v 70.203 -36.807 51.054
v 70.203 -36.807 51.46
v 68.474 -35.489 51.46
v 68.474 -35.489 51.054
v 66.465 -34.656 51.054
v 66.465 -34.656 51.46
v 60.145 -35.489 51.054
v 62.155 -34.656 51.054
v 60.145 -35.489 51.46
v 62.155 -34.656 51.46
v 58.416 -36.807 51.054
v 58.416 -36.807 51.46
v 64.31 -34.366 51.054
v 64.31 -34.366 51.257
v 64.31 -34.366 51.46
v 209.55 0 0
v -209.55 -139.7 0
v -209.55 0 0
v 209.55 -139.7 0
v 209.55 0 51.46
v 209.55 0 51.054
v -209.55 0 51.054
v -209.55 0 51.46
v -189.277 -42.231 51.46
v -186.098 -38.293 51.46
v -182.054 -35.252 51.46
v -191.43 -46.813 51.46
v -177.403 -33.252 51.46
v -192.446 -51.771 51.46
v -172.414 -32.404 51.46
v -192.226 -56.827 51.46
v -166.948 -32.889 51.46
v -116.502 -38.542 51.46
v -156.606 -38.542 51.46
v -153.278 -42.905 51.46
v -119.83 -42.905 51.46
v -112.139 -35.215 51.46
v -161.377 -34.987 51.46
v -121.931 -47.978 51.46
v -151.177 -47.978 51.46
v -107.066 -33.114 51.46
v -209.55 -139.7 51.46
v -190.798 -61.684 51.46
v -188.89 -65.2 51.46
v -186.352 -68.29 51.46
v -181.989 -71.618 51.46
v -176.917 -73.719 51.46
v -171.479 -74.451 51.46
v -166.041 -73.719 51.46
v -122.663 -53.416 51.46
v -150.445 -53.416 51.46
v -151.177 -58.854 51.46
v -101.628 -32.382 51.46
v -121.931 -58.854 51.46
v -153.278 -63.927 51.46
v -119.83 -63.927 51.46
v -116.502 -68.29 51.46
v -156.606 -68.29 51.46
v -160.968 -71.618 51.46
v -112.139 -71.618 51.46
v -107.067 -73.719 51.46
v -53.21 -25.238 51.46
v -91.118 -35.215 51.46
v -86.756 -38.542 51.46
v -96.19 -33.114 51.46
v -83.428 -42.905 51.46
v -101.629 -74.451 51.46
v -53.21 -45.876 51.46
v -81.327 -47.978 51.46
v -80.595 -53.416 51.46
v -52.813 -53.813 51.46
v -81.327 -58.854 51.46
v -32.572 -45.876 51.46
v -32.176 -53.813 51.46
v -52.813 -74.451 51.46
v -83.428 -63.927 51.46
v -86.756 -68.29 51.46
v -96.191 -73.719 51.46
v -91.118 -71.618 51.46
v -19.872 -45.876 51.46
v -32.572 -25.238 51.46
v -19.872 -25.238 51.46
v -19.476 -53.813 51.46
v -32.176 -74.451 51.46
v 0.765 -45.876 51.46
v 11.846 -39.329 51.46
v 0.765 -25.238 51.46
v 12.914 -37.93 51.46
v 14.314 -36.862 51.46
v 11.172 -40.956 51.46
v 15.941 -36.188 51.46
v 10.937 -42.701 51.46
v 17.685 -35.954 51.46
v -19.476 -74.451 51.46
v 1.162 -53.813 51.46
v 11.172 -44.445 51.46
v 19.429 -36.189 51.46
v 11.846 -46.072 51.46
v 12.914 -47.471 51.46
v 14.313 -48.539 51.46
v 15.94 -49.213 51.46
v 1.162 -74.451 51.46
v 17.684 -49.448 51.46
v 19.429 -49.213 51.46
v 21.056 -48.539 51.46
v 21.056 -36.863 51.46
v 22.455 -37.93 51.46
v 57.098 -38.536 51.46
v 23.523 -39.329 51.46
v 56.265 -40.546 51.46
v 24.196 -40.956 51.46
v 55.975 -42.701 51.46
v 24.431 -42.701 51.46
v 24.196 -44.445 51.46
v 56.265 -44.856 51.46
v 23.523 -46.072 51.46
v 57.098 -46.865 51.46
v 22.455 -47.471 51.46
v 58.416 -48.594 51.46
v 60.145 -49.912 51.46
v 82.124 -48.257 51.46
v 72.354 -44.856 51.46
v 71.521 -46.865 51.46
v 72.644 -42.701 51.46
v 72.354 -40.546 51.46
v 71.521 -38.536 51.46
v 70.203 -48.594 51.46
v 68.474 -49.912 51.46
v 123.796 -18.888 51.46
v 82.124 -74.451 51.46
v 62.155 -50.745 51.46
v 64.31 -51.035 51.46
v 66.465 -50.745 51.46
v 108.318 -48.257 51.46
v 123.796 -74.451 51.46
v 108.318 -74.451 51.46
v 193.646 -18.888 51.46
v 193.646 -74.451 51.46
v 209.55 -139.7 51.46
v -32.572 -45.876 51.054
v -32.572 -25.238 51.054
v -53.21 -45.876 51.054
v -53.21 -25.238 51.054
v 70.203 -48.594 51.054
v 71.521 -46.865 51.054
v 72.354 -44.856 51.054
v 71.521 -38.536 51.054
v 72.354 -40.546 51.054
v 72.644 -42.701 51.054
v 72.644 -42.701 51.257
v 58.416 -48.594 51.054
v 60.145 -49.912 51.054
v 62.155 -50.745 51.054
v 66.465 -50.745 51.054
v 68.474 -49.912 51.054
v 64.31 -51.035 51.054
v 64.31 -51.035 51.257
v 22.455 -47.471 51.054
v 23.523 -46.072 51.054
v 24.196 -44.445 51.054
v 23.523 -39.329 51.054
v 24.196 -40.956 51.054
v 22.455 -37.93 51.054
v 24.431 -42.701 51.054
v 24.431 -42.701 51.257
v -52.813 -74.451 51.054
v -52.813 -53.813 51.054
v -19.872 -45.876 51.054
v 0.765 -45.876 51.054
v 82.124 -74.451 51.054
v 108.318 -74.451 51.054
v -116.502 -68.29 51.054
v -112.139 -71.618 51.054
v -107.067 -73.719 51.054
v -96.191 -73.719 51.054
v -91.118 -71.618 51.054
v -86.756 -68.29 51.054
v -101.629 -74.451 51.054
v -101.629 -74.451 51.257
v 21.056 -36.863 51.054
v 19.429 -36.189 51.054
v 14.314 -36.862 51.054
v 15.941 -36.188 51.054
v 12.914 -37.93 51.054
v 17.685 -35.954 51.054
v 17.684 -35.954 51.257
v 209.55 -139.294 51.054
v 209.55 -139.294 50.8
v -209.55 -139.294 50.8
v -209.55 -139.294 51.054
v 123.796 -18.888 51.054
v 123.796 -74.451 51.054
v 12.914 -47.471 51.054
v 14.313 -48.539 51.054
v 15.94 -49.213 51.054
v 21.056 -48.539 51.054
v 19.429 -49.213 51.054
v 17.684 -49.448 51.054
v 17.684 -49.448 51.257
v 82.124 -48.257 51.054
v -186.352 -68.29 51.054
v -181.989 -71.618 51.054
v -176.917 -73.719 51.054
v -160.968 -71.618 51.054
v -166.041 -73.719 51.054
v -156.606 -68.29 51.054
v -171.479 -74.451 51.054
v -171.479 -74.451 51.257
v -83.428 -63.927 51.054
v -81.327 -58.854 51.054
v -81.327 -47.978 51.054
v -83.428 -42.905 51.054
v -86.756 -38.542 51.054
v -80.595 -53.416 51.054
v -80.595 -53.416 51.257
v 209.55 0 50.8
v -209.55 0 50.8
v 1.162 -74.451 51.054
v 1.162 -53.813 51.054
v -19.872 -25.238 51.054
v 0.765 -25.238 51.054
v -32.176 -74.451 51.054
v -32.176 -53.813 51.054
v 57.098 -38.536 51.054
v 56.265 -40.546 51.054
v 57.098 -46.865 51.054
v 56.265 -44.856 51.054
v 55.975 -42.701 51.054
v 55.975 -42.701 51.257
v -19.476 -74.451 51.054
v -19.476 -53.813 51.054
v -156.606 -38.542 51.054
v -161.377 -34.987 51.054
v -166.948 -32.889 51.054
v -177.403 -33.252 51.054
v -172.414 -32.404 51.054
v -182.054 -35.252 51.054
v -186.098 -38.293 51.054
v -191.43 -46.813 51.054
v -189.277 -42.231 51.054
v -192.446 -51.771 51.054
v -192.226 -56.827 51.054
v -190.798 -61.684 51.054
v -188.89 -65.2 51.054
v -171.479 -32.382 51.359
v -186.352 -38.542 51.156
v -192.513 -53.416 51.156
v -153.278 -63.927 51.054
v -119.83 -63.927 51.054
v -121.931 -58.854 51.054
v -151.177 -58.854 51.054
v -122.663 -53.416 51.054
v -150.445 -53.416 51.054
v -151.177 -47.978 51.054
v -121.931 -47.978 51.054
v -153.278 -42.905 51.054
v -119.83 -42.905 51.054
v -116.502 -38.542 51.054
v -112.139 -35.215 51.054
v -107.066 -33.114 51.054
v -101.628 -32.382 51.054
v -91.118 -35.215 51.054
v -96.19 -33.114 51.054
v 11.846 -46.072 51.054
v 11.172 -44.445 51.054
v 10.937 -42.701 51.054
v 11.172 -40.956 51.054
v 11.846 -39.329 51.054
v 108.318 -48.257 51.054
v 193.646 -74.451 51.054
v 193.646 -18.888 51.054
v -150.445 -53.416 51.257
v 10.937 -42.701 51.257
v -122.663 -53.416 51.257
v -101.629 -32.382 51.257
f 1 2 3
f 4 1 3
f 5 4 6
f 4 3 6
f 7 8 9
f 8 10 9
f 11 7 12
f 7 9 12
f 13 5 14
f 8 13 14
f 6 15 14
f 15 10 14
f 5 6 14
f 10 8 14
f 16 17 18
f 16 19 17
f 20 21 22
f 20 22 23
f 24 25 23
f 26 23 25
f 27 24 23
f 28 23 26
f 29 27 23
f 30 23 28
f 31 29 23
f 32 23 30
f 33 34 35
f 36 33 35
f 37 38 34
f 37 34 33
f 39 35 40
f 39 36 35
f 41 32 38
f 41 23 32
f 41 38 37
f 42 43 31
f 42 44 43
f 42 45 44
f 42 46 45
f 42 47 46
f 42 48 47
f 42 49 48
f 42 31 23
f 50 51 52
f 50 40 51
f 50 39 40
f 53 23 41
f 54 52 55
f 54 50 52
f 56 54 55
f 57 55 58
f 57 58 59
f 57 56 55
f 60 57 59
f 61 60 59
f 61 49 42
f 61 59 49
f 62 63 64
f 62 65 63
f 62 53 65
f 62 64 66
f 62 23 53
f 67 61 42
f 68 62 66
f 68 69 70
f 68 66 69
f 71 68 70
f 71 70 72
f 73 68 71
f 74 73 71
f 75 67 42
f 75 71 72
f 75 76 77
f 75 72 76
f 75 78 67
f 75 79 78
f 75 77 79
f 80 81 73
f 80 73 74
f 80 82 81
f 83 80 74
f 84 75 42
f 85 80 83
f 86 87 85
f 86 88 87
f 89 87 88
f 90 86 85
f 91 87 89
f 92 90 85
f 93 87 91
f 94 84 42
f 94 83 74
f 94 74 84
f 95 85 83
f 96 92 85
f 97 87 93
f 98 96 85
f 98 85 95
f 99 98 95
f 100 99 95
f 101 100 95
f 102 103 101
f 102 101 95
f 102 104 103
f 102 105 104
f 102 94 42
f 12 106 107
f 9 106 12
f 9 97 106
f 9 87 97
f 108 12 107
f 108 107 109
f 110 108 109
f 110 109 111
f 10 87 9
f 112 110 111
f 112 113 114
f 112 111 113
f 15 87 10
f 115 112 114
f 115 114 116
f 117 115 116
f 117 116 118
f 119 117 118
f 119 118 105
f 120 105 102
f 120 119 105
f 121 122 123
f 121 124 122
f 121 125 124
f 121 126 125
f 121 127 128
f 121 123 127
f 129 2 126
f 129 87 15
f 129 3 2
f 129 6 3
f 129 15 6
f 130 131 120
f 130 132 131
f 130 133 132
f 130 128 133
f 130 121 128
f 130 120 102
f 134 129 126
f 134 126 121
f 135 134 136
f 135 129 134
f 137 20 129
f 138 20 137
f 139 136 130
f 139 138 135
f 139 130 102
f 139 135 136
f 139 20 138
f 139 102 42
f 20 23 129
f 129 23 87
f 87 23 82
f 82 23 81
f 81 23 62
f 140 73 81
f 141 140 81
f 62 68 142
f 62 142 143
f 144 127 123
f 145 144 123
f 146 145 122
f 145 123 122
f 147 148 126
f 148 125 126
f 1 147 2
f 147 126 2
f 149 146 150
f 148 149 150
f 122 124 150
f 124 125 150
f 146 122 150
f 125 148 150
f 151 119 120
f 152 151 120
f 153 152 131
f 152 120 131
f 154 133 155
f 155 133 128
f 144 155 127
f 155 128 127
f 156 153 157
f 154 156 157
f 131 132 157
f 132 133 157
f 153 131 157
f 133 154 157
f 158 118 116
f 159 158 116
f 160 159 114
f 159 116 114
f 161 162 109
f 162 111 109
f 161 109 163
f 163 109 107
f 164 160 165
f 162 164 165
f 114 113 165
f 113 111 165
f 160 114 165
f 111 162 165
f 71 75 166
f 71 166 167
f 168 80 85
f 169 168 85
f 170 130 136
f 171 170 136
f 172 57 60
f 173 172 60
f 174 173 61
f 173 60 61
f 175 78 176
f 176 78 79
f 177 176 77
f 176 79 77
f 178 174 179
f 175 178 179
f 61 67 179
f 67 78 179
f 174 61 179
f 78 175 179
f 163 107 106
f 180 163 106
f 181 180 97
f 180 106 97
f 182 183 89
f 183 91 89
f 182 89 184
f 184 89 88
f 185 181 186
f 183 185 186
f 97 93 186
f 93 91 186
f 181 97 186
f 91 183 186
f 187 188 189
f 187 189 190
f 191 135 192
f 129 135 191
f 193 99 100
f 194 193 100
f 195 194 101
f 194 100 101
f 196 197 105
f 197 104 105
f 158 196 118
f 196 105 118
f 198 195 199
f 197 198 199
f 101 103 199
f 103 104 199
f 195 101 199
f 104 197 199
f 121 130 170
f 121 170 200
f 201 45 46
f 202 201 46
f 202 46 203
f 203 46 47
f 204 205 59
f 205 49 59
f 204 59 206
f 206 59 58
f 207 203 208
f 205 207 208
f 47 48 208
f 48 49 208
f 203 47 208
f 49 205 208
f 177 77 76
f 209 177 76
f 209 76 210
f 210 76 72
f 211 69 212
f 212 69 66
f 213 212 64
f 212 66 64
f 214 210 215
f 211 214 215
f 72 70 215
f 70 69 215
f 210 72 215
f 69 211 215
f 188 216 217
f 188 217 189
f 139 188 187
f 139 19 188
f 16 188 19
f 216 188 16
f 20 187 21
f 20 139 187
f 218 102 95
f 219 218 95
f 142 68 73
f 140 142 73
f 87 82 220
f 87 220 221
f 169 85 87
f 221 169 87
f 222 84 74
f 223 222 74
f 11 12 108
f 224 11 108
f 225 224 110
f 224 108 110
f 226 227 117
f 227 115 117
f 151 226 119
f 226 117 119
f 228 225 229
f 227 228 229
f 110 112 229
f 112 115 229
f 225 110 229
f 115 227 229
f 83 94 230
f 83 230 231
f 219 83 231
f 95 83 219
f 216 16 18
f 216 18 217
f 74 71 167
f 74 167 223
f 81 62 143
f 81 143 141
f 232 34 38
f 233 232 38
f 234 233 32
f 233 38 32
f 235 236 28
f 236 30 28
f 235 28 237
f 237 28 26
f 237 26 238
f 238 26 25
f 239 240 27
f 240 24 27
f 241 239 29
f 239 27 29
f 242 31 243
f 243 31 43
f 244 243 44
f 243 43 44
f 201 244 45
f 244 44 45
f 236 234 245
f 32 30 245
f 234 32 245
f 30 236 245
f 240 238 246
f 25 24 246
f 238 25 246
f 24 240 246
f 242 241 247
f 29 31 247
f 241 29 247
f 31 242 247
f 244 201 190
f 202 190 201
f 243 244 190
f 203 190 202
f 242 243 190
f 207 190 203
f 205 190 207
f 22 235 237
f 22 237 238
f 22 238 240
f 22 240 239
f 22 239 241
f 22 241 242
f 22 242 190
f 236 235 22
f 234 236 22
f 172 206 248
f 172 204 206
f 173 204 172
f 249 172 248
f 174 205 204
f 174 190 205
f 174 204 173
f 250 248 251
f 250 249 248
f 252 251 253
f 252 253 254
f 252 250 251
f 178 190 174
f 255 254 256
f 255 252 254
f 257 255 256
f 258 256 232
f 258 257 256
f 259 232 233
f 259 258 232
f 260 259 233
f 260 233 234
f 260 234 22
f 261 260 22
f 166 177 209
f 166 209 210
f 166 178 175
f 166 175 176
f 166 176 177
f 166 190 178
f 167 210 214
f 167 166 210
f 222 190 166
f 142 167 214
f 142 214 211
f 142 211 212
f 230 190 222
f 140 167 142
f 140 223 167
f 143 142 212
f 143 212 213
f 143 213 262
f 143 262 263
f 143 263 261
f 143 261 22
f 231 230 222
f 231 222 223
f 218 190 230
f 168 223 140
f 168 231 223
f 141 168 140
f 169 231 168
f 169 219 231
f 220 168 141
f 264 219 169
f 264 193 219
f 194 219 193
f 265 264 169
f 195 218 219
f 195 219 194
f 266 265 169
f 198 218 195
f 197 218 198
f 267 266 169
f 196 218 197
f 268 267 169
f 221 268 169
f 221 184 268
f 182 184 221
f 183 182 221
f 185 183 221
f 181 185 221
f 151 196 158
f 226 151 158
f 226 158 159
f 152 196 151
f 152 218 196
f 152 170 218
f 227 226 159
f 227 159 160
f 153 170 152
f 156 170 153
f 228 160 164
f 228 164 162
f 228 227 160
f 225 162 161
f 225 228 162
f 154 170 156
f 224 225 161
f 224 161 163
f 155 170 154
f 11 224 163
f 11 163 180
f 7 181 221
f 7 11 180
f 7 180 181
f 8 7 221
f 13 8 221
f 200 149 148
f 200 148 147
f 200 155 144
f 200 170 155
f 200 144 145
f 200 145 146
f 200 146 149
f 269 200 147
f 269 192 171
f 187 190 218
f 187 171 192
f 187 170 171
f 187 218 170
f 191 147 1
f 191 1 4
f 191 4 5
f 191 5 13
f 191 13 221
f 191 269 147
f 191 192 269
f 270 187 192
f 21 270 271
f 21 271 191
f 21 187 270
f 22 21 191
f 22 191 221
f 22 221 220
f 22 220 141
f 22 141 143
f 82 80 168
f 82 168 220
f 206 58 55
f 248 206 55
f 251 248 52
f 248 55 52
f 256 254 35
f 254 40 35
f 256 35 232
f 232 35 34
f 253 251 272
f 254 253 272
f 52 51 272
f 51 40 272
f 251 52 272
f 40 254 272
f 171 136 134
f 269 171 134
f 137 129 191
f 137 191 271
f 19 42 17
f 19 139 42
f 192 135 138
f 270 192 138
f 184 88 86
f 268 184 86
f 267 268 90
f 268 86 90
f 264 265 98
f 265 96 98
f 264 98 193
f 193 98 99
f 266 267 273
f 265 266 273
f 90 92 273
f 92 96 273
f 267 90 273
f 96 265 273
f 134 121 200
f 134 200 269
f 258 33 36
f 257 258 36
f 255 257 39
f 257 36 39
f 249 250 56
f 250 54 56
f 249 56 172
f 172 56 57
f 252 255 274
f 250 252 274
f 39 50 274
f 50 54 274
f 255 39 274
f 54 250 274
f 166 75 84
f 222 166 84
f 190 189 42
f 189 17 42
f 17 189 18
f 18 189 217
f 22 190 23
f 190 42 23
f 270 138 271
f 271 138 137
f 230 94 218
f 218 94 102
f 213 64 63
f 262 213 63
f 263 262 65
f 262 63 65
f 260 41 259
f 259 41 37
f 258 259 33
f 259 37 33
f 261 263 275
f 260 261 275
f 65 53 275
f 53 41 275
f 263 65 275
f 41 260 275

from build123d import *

# Parameters (mm, degrees)
F1_DEPTH = 209.55
F2_W     = 20.6375
F2_H     = 20.6375
F2_W_2   = 20.6374746
F2_W_3   = 69.85
F2_H_2   = 55.5625
F2_W_4   = 26.19375
F2_H_3   = 26.19375
F3_DEPTH = 0.4064


# Not quite as in the source:
# - the dataset's text gives a spline's control points without its knots; the knots are read off the source's solid


with BuildPart() as f1:
    # F0 (on Right) → F1 (new body, symmetric)
    with BuildSketch(Plane.YZ):
        Polygon((-139.7, 0), (0, 0), (0, 50.8), (-139.2936, 50.8), (-139.2936, 51.054), (0, 51.054), (0, 51.4604), (-139.7, 51.4604), align=None)
    extrude(amount=F1_DEPTH, both=True)

    # F2 (on face) → F3 (cut, through all)
    with BuildSketch(Plane.XY.offset(51.4604)):
        with Locations((-42.494652462, -64.131877524)):
            Rectangle(F2_W, F2_H)
        with Locations((-42.891171862, -35.556877524)):
            Rectangle(F2_W, F2_H)
        with Locations((-9.157152462, -64.131877524)):
            Rectangle(F2_W, F2_H)
        with Locations((-9.553684562, -35.556877524)):
            Rectangle(F2_W_2, F2_H)
        with Locations((158.720972538, -46.669377524)):
            Rectangle(F2_W_3, F2_H_2)
        with Locations((95.220972538, -61.353752524)):
            Rectangle(F2_W_4, F2_H_3)
        with BuildLine():
            add(Edge.make_bspline(
                [(22.455052538, -37.929872524), (21.206185338, -36.680675124), (19.450918338, -35.953752524), (17.684246738, -35.953752524)],
                knots=[7, 7, 7, 7, 8, 8, 8, 8], degree=3))
            add(Edge.make_bspline(
                [(17.684246738, -35.953752524), (15.918311738, -35.953752524), (14.163044738, -36.680675124), (12.913847338, -37.929872524)],
                knots=[0, 0, 0, 0, 1, 1, 1, 1], degree=3))
            add(Edge.make_bspline(
                [(12.913847338, -37.929872524), (11.664980138, -39.178384124), (10.937371738, -40.933981324), (10.937371738, -42.700627524), (10.937371738, -44.466587924), (11.664980138, -46.222235924), (12.913847338, -47.471407924)],
                knots=[1, 1, 1, 1, 2, 2, 2, 3, 3, 3, 3], degree=3))
            add(Edge.make_bspline(
                [(12.913847338, -47.471407924), (14.163044738, -48.719894124), (15.918311738, -49.447502524), (17.684246738, -49.447502524), (19.450918338, -49.447502524), (21.206185338, -48.719894124), (22.455052538, -47.471407924)],
                knots=[3, 3, 3, 3, 4, 4, 4, 5, 5, 5, 5], degree=3))
            add(Edge.make_bspline(
                [(22.455052538, -47.471407924), (23.704224538, -46.222235924), (24.431121738, -44.466587924), (24.431121738, -42.700627524), (24.431121738, -40.933981324), (23.704224538, -39.178384124), (22.455052538, -37.929872524)],
                knots=[5, 5, 5, 5, 6, 6, 6, 7, 7, 7, 7], degree=3))
        make_face()
        with BuildLine():
            add(Edge.make_bspline(
                [(-86.755549462, -38.542393524), (-90.649191662, -34.648751324), (-96.122028062, -32.381877524), (-101.629027462, -32.381877524)],
                knots=[7, 7, 7, 7, 8, 8, 8, 8], degree=3))
            add(Edge.make_bspline(
                [(-101.629027462, -32.381877524), (-107.135341062, -32.381877524), (-112.608533062, -34.648751324), (-116.502175262, -38.542393524)],
                knots=[0, 0, 0, 0, 1, 1, 1, 1], degree=3))
            add(Edge.make_bspline(
                [(-116.502175262, -38.542393524), (-120.395868262, -42.436035724), (-122.663402462, -47.908922924), (-122.663402462, -53.416252524), (-122.663402462, -58.922896324), (-120.395868262, -64.395783524), (-116.502175262, -68.290136924)],
                knots=[1, 1, 1, 1, 2, 2, 2, 3, 3, 3, 3], degree=3))
            add(Edge.make_bspline(
                [(-116.502175262, -68.290136924), (-112.608533062, -72.183779124), (-107.135341062, -74.450627524), (-101.629027462, -74.450627524), (-96.122028062, -74.450627524), (-90.649191662, -72.183779124), (-86.755549462, -68.290136924)],
                knots=[3, 3, 3, 3, 4, 4, 4, 5, 5, 5, 5], degree=3))
            add(Edge.make_bspline(
                [(-86.755549462, -68.290136924), (-82.861551662, -64.395783524), (-80.594652462, -58.922896324), (-80.594652462, -53.416252524), (-80.594652462, -47.908922924), (-82.861551662, -42.436035724), (-86.755549462, -38.542393524)],
                knots=[5, 5, 5, 5, 6, 6, 6, 7, 7, 7, 7], degree=3))
        make_face()
        with BuildLine():
            add(Edge.make_bspline(
                [(-156.605549462, -38.542393524), (-160.499191662, -34.648751324), (-165.972028062, -32.381877524), (-171.479027462, -32.381877524)],
                knots=[7, 7, 7, 7, 8, 8, 8, 8], degree=3))
            add(Edge.make_bspline(
                [(-171.479027462, -32.381877524), (-176.985341062, -32.381877524), (-182.458355262, -34.648751324), (-186.352353062, -38.542393524), (-190.246350862, -42.436035724), (-192.513402462, -47.908922924), (-192.513402462, -53.416252524), (-192.513402462, -58.922896324), (-190.246350862, -64.395783524), (-186.352353062, -68.290136924)],
                knots=[0, 0, 0, 0, 1, 1, 1, 2, 2, 2, 3, 3, 3, 3], degree=3))
            add(Edge.make_bspline(
                [(-186.352353062, -68.290136924), (-182.458355262, -72.183779124), (-176.985341062, -74.450627524), (-171.479027462, -74.450627524), (-165.972028062, -74.450627524), (-160.499191662, -72.183779124), (-156.605549462, -68.290136924)],
                knots=[3, 3, 3, 3, 4, 4, 4, 5, 5, 5, 5], degree=3))
            add(Edge.make_bspline(
                [(-156.605549462, -68.290136924), (-152.711551662, -64.395783524), (-150.444652462, -58.922896324), (-150.444652462, -53.416252524), (-150.444652462, -47.908922924), (-152.711551662, -42.436035724), (-156.605549462, -38.542393524)],
                knots=[5, 5, 5, 5, 6, 6, 6, 7, 7, 7, 7], degree=3))
        make_face()
        with BuildLine():
            add(Edge.make_bspline(
                [(70.202658338, -36.807471924), (68.659963938, -35.264066324), (66.491972338, -34.366252524), (64.309502738, -34.366252524)],
                knots=[7, 7, 7, 7, 8, 8, 8, 8], degree=3))
            add(Edge.make_bspline(
                [(64.309502738, -34.366252524), (62.127363338, -34.366252524), (59.959016138, -35.264066324), (58.416321738, -36.807471924)],
                knots=[0, 0, 0, 0, 1, 1, 1, 1], degree=3))
            add(Edge.make_bspline(
                [(58.416321738, -36.807471924), (56.873271738, -38.350166324), (55.975127738, -40.518513524), (55.975127738, -42.700627524), (55.975127738, -44.882766924), (56.873271738, -47.051114124), (58.416321738, -48.593808524)],
                knots=[1, 1, 1, 1, 2, 2, 2, 3, 3, 3, 3], degree=3))
            add(Edge.make_bspline(
                [(58.416321738, -48.593808524), (59.959016138, -50.136553724), (62.127363338, -51.035002524), (64.309502738, -51.035002524), (66.491972338, -51.035002524), (68.659963938, -50.136553724), (70.202658338, -48.593808524)],
                knots=[3, 3, 3, 3, 4, 4, 4, 5, 5, 5, 5], degree=3))
            add(Edge.make_bspline(
                [(70.202658338, -48.593808524), (71.745759138, -47.051114124), (72.643877738, -44.882766924), (72.643877738, -42.700627524), (72.643877738, -40.518513524), (71.745759138, -38.350166324), (70.202658338, -36.807471924)],
                knots=[5, 5, 5, 5, 6, 6, 6, 7, 7, 7, 7], degree=3))
        make_face()
    extrude(amount=-F3_DEPTH, mode=Mode.SUBTRACT)


solid = f1.part
